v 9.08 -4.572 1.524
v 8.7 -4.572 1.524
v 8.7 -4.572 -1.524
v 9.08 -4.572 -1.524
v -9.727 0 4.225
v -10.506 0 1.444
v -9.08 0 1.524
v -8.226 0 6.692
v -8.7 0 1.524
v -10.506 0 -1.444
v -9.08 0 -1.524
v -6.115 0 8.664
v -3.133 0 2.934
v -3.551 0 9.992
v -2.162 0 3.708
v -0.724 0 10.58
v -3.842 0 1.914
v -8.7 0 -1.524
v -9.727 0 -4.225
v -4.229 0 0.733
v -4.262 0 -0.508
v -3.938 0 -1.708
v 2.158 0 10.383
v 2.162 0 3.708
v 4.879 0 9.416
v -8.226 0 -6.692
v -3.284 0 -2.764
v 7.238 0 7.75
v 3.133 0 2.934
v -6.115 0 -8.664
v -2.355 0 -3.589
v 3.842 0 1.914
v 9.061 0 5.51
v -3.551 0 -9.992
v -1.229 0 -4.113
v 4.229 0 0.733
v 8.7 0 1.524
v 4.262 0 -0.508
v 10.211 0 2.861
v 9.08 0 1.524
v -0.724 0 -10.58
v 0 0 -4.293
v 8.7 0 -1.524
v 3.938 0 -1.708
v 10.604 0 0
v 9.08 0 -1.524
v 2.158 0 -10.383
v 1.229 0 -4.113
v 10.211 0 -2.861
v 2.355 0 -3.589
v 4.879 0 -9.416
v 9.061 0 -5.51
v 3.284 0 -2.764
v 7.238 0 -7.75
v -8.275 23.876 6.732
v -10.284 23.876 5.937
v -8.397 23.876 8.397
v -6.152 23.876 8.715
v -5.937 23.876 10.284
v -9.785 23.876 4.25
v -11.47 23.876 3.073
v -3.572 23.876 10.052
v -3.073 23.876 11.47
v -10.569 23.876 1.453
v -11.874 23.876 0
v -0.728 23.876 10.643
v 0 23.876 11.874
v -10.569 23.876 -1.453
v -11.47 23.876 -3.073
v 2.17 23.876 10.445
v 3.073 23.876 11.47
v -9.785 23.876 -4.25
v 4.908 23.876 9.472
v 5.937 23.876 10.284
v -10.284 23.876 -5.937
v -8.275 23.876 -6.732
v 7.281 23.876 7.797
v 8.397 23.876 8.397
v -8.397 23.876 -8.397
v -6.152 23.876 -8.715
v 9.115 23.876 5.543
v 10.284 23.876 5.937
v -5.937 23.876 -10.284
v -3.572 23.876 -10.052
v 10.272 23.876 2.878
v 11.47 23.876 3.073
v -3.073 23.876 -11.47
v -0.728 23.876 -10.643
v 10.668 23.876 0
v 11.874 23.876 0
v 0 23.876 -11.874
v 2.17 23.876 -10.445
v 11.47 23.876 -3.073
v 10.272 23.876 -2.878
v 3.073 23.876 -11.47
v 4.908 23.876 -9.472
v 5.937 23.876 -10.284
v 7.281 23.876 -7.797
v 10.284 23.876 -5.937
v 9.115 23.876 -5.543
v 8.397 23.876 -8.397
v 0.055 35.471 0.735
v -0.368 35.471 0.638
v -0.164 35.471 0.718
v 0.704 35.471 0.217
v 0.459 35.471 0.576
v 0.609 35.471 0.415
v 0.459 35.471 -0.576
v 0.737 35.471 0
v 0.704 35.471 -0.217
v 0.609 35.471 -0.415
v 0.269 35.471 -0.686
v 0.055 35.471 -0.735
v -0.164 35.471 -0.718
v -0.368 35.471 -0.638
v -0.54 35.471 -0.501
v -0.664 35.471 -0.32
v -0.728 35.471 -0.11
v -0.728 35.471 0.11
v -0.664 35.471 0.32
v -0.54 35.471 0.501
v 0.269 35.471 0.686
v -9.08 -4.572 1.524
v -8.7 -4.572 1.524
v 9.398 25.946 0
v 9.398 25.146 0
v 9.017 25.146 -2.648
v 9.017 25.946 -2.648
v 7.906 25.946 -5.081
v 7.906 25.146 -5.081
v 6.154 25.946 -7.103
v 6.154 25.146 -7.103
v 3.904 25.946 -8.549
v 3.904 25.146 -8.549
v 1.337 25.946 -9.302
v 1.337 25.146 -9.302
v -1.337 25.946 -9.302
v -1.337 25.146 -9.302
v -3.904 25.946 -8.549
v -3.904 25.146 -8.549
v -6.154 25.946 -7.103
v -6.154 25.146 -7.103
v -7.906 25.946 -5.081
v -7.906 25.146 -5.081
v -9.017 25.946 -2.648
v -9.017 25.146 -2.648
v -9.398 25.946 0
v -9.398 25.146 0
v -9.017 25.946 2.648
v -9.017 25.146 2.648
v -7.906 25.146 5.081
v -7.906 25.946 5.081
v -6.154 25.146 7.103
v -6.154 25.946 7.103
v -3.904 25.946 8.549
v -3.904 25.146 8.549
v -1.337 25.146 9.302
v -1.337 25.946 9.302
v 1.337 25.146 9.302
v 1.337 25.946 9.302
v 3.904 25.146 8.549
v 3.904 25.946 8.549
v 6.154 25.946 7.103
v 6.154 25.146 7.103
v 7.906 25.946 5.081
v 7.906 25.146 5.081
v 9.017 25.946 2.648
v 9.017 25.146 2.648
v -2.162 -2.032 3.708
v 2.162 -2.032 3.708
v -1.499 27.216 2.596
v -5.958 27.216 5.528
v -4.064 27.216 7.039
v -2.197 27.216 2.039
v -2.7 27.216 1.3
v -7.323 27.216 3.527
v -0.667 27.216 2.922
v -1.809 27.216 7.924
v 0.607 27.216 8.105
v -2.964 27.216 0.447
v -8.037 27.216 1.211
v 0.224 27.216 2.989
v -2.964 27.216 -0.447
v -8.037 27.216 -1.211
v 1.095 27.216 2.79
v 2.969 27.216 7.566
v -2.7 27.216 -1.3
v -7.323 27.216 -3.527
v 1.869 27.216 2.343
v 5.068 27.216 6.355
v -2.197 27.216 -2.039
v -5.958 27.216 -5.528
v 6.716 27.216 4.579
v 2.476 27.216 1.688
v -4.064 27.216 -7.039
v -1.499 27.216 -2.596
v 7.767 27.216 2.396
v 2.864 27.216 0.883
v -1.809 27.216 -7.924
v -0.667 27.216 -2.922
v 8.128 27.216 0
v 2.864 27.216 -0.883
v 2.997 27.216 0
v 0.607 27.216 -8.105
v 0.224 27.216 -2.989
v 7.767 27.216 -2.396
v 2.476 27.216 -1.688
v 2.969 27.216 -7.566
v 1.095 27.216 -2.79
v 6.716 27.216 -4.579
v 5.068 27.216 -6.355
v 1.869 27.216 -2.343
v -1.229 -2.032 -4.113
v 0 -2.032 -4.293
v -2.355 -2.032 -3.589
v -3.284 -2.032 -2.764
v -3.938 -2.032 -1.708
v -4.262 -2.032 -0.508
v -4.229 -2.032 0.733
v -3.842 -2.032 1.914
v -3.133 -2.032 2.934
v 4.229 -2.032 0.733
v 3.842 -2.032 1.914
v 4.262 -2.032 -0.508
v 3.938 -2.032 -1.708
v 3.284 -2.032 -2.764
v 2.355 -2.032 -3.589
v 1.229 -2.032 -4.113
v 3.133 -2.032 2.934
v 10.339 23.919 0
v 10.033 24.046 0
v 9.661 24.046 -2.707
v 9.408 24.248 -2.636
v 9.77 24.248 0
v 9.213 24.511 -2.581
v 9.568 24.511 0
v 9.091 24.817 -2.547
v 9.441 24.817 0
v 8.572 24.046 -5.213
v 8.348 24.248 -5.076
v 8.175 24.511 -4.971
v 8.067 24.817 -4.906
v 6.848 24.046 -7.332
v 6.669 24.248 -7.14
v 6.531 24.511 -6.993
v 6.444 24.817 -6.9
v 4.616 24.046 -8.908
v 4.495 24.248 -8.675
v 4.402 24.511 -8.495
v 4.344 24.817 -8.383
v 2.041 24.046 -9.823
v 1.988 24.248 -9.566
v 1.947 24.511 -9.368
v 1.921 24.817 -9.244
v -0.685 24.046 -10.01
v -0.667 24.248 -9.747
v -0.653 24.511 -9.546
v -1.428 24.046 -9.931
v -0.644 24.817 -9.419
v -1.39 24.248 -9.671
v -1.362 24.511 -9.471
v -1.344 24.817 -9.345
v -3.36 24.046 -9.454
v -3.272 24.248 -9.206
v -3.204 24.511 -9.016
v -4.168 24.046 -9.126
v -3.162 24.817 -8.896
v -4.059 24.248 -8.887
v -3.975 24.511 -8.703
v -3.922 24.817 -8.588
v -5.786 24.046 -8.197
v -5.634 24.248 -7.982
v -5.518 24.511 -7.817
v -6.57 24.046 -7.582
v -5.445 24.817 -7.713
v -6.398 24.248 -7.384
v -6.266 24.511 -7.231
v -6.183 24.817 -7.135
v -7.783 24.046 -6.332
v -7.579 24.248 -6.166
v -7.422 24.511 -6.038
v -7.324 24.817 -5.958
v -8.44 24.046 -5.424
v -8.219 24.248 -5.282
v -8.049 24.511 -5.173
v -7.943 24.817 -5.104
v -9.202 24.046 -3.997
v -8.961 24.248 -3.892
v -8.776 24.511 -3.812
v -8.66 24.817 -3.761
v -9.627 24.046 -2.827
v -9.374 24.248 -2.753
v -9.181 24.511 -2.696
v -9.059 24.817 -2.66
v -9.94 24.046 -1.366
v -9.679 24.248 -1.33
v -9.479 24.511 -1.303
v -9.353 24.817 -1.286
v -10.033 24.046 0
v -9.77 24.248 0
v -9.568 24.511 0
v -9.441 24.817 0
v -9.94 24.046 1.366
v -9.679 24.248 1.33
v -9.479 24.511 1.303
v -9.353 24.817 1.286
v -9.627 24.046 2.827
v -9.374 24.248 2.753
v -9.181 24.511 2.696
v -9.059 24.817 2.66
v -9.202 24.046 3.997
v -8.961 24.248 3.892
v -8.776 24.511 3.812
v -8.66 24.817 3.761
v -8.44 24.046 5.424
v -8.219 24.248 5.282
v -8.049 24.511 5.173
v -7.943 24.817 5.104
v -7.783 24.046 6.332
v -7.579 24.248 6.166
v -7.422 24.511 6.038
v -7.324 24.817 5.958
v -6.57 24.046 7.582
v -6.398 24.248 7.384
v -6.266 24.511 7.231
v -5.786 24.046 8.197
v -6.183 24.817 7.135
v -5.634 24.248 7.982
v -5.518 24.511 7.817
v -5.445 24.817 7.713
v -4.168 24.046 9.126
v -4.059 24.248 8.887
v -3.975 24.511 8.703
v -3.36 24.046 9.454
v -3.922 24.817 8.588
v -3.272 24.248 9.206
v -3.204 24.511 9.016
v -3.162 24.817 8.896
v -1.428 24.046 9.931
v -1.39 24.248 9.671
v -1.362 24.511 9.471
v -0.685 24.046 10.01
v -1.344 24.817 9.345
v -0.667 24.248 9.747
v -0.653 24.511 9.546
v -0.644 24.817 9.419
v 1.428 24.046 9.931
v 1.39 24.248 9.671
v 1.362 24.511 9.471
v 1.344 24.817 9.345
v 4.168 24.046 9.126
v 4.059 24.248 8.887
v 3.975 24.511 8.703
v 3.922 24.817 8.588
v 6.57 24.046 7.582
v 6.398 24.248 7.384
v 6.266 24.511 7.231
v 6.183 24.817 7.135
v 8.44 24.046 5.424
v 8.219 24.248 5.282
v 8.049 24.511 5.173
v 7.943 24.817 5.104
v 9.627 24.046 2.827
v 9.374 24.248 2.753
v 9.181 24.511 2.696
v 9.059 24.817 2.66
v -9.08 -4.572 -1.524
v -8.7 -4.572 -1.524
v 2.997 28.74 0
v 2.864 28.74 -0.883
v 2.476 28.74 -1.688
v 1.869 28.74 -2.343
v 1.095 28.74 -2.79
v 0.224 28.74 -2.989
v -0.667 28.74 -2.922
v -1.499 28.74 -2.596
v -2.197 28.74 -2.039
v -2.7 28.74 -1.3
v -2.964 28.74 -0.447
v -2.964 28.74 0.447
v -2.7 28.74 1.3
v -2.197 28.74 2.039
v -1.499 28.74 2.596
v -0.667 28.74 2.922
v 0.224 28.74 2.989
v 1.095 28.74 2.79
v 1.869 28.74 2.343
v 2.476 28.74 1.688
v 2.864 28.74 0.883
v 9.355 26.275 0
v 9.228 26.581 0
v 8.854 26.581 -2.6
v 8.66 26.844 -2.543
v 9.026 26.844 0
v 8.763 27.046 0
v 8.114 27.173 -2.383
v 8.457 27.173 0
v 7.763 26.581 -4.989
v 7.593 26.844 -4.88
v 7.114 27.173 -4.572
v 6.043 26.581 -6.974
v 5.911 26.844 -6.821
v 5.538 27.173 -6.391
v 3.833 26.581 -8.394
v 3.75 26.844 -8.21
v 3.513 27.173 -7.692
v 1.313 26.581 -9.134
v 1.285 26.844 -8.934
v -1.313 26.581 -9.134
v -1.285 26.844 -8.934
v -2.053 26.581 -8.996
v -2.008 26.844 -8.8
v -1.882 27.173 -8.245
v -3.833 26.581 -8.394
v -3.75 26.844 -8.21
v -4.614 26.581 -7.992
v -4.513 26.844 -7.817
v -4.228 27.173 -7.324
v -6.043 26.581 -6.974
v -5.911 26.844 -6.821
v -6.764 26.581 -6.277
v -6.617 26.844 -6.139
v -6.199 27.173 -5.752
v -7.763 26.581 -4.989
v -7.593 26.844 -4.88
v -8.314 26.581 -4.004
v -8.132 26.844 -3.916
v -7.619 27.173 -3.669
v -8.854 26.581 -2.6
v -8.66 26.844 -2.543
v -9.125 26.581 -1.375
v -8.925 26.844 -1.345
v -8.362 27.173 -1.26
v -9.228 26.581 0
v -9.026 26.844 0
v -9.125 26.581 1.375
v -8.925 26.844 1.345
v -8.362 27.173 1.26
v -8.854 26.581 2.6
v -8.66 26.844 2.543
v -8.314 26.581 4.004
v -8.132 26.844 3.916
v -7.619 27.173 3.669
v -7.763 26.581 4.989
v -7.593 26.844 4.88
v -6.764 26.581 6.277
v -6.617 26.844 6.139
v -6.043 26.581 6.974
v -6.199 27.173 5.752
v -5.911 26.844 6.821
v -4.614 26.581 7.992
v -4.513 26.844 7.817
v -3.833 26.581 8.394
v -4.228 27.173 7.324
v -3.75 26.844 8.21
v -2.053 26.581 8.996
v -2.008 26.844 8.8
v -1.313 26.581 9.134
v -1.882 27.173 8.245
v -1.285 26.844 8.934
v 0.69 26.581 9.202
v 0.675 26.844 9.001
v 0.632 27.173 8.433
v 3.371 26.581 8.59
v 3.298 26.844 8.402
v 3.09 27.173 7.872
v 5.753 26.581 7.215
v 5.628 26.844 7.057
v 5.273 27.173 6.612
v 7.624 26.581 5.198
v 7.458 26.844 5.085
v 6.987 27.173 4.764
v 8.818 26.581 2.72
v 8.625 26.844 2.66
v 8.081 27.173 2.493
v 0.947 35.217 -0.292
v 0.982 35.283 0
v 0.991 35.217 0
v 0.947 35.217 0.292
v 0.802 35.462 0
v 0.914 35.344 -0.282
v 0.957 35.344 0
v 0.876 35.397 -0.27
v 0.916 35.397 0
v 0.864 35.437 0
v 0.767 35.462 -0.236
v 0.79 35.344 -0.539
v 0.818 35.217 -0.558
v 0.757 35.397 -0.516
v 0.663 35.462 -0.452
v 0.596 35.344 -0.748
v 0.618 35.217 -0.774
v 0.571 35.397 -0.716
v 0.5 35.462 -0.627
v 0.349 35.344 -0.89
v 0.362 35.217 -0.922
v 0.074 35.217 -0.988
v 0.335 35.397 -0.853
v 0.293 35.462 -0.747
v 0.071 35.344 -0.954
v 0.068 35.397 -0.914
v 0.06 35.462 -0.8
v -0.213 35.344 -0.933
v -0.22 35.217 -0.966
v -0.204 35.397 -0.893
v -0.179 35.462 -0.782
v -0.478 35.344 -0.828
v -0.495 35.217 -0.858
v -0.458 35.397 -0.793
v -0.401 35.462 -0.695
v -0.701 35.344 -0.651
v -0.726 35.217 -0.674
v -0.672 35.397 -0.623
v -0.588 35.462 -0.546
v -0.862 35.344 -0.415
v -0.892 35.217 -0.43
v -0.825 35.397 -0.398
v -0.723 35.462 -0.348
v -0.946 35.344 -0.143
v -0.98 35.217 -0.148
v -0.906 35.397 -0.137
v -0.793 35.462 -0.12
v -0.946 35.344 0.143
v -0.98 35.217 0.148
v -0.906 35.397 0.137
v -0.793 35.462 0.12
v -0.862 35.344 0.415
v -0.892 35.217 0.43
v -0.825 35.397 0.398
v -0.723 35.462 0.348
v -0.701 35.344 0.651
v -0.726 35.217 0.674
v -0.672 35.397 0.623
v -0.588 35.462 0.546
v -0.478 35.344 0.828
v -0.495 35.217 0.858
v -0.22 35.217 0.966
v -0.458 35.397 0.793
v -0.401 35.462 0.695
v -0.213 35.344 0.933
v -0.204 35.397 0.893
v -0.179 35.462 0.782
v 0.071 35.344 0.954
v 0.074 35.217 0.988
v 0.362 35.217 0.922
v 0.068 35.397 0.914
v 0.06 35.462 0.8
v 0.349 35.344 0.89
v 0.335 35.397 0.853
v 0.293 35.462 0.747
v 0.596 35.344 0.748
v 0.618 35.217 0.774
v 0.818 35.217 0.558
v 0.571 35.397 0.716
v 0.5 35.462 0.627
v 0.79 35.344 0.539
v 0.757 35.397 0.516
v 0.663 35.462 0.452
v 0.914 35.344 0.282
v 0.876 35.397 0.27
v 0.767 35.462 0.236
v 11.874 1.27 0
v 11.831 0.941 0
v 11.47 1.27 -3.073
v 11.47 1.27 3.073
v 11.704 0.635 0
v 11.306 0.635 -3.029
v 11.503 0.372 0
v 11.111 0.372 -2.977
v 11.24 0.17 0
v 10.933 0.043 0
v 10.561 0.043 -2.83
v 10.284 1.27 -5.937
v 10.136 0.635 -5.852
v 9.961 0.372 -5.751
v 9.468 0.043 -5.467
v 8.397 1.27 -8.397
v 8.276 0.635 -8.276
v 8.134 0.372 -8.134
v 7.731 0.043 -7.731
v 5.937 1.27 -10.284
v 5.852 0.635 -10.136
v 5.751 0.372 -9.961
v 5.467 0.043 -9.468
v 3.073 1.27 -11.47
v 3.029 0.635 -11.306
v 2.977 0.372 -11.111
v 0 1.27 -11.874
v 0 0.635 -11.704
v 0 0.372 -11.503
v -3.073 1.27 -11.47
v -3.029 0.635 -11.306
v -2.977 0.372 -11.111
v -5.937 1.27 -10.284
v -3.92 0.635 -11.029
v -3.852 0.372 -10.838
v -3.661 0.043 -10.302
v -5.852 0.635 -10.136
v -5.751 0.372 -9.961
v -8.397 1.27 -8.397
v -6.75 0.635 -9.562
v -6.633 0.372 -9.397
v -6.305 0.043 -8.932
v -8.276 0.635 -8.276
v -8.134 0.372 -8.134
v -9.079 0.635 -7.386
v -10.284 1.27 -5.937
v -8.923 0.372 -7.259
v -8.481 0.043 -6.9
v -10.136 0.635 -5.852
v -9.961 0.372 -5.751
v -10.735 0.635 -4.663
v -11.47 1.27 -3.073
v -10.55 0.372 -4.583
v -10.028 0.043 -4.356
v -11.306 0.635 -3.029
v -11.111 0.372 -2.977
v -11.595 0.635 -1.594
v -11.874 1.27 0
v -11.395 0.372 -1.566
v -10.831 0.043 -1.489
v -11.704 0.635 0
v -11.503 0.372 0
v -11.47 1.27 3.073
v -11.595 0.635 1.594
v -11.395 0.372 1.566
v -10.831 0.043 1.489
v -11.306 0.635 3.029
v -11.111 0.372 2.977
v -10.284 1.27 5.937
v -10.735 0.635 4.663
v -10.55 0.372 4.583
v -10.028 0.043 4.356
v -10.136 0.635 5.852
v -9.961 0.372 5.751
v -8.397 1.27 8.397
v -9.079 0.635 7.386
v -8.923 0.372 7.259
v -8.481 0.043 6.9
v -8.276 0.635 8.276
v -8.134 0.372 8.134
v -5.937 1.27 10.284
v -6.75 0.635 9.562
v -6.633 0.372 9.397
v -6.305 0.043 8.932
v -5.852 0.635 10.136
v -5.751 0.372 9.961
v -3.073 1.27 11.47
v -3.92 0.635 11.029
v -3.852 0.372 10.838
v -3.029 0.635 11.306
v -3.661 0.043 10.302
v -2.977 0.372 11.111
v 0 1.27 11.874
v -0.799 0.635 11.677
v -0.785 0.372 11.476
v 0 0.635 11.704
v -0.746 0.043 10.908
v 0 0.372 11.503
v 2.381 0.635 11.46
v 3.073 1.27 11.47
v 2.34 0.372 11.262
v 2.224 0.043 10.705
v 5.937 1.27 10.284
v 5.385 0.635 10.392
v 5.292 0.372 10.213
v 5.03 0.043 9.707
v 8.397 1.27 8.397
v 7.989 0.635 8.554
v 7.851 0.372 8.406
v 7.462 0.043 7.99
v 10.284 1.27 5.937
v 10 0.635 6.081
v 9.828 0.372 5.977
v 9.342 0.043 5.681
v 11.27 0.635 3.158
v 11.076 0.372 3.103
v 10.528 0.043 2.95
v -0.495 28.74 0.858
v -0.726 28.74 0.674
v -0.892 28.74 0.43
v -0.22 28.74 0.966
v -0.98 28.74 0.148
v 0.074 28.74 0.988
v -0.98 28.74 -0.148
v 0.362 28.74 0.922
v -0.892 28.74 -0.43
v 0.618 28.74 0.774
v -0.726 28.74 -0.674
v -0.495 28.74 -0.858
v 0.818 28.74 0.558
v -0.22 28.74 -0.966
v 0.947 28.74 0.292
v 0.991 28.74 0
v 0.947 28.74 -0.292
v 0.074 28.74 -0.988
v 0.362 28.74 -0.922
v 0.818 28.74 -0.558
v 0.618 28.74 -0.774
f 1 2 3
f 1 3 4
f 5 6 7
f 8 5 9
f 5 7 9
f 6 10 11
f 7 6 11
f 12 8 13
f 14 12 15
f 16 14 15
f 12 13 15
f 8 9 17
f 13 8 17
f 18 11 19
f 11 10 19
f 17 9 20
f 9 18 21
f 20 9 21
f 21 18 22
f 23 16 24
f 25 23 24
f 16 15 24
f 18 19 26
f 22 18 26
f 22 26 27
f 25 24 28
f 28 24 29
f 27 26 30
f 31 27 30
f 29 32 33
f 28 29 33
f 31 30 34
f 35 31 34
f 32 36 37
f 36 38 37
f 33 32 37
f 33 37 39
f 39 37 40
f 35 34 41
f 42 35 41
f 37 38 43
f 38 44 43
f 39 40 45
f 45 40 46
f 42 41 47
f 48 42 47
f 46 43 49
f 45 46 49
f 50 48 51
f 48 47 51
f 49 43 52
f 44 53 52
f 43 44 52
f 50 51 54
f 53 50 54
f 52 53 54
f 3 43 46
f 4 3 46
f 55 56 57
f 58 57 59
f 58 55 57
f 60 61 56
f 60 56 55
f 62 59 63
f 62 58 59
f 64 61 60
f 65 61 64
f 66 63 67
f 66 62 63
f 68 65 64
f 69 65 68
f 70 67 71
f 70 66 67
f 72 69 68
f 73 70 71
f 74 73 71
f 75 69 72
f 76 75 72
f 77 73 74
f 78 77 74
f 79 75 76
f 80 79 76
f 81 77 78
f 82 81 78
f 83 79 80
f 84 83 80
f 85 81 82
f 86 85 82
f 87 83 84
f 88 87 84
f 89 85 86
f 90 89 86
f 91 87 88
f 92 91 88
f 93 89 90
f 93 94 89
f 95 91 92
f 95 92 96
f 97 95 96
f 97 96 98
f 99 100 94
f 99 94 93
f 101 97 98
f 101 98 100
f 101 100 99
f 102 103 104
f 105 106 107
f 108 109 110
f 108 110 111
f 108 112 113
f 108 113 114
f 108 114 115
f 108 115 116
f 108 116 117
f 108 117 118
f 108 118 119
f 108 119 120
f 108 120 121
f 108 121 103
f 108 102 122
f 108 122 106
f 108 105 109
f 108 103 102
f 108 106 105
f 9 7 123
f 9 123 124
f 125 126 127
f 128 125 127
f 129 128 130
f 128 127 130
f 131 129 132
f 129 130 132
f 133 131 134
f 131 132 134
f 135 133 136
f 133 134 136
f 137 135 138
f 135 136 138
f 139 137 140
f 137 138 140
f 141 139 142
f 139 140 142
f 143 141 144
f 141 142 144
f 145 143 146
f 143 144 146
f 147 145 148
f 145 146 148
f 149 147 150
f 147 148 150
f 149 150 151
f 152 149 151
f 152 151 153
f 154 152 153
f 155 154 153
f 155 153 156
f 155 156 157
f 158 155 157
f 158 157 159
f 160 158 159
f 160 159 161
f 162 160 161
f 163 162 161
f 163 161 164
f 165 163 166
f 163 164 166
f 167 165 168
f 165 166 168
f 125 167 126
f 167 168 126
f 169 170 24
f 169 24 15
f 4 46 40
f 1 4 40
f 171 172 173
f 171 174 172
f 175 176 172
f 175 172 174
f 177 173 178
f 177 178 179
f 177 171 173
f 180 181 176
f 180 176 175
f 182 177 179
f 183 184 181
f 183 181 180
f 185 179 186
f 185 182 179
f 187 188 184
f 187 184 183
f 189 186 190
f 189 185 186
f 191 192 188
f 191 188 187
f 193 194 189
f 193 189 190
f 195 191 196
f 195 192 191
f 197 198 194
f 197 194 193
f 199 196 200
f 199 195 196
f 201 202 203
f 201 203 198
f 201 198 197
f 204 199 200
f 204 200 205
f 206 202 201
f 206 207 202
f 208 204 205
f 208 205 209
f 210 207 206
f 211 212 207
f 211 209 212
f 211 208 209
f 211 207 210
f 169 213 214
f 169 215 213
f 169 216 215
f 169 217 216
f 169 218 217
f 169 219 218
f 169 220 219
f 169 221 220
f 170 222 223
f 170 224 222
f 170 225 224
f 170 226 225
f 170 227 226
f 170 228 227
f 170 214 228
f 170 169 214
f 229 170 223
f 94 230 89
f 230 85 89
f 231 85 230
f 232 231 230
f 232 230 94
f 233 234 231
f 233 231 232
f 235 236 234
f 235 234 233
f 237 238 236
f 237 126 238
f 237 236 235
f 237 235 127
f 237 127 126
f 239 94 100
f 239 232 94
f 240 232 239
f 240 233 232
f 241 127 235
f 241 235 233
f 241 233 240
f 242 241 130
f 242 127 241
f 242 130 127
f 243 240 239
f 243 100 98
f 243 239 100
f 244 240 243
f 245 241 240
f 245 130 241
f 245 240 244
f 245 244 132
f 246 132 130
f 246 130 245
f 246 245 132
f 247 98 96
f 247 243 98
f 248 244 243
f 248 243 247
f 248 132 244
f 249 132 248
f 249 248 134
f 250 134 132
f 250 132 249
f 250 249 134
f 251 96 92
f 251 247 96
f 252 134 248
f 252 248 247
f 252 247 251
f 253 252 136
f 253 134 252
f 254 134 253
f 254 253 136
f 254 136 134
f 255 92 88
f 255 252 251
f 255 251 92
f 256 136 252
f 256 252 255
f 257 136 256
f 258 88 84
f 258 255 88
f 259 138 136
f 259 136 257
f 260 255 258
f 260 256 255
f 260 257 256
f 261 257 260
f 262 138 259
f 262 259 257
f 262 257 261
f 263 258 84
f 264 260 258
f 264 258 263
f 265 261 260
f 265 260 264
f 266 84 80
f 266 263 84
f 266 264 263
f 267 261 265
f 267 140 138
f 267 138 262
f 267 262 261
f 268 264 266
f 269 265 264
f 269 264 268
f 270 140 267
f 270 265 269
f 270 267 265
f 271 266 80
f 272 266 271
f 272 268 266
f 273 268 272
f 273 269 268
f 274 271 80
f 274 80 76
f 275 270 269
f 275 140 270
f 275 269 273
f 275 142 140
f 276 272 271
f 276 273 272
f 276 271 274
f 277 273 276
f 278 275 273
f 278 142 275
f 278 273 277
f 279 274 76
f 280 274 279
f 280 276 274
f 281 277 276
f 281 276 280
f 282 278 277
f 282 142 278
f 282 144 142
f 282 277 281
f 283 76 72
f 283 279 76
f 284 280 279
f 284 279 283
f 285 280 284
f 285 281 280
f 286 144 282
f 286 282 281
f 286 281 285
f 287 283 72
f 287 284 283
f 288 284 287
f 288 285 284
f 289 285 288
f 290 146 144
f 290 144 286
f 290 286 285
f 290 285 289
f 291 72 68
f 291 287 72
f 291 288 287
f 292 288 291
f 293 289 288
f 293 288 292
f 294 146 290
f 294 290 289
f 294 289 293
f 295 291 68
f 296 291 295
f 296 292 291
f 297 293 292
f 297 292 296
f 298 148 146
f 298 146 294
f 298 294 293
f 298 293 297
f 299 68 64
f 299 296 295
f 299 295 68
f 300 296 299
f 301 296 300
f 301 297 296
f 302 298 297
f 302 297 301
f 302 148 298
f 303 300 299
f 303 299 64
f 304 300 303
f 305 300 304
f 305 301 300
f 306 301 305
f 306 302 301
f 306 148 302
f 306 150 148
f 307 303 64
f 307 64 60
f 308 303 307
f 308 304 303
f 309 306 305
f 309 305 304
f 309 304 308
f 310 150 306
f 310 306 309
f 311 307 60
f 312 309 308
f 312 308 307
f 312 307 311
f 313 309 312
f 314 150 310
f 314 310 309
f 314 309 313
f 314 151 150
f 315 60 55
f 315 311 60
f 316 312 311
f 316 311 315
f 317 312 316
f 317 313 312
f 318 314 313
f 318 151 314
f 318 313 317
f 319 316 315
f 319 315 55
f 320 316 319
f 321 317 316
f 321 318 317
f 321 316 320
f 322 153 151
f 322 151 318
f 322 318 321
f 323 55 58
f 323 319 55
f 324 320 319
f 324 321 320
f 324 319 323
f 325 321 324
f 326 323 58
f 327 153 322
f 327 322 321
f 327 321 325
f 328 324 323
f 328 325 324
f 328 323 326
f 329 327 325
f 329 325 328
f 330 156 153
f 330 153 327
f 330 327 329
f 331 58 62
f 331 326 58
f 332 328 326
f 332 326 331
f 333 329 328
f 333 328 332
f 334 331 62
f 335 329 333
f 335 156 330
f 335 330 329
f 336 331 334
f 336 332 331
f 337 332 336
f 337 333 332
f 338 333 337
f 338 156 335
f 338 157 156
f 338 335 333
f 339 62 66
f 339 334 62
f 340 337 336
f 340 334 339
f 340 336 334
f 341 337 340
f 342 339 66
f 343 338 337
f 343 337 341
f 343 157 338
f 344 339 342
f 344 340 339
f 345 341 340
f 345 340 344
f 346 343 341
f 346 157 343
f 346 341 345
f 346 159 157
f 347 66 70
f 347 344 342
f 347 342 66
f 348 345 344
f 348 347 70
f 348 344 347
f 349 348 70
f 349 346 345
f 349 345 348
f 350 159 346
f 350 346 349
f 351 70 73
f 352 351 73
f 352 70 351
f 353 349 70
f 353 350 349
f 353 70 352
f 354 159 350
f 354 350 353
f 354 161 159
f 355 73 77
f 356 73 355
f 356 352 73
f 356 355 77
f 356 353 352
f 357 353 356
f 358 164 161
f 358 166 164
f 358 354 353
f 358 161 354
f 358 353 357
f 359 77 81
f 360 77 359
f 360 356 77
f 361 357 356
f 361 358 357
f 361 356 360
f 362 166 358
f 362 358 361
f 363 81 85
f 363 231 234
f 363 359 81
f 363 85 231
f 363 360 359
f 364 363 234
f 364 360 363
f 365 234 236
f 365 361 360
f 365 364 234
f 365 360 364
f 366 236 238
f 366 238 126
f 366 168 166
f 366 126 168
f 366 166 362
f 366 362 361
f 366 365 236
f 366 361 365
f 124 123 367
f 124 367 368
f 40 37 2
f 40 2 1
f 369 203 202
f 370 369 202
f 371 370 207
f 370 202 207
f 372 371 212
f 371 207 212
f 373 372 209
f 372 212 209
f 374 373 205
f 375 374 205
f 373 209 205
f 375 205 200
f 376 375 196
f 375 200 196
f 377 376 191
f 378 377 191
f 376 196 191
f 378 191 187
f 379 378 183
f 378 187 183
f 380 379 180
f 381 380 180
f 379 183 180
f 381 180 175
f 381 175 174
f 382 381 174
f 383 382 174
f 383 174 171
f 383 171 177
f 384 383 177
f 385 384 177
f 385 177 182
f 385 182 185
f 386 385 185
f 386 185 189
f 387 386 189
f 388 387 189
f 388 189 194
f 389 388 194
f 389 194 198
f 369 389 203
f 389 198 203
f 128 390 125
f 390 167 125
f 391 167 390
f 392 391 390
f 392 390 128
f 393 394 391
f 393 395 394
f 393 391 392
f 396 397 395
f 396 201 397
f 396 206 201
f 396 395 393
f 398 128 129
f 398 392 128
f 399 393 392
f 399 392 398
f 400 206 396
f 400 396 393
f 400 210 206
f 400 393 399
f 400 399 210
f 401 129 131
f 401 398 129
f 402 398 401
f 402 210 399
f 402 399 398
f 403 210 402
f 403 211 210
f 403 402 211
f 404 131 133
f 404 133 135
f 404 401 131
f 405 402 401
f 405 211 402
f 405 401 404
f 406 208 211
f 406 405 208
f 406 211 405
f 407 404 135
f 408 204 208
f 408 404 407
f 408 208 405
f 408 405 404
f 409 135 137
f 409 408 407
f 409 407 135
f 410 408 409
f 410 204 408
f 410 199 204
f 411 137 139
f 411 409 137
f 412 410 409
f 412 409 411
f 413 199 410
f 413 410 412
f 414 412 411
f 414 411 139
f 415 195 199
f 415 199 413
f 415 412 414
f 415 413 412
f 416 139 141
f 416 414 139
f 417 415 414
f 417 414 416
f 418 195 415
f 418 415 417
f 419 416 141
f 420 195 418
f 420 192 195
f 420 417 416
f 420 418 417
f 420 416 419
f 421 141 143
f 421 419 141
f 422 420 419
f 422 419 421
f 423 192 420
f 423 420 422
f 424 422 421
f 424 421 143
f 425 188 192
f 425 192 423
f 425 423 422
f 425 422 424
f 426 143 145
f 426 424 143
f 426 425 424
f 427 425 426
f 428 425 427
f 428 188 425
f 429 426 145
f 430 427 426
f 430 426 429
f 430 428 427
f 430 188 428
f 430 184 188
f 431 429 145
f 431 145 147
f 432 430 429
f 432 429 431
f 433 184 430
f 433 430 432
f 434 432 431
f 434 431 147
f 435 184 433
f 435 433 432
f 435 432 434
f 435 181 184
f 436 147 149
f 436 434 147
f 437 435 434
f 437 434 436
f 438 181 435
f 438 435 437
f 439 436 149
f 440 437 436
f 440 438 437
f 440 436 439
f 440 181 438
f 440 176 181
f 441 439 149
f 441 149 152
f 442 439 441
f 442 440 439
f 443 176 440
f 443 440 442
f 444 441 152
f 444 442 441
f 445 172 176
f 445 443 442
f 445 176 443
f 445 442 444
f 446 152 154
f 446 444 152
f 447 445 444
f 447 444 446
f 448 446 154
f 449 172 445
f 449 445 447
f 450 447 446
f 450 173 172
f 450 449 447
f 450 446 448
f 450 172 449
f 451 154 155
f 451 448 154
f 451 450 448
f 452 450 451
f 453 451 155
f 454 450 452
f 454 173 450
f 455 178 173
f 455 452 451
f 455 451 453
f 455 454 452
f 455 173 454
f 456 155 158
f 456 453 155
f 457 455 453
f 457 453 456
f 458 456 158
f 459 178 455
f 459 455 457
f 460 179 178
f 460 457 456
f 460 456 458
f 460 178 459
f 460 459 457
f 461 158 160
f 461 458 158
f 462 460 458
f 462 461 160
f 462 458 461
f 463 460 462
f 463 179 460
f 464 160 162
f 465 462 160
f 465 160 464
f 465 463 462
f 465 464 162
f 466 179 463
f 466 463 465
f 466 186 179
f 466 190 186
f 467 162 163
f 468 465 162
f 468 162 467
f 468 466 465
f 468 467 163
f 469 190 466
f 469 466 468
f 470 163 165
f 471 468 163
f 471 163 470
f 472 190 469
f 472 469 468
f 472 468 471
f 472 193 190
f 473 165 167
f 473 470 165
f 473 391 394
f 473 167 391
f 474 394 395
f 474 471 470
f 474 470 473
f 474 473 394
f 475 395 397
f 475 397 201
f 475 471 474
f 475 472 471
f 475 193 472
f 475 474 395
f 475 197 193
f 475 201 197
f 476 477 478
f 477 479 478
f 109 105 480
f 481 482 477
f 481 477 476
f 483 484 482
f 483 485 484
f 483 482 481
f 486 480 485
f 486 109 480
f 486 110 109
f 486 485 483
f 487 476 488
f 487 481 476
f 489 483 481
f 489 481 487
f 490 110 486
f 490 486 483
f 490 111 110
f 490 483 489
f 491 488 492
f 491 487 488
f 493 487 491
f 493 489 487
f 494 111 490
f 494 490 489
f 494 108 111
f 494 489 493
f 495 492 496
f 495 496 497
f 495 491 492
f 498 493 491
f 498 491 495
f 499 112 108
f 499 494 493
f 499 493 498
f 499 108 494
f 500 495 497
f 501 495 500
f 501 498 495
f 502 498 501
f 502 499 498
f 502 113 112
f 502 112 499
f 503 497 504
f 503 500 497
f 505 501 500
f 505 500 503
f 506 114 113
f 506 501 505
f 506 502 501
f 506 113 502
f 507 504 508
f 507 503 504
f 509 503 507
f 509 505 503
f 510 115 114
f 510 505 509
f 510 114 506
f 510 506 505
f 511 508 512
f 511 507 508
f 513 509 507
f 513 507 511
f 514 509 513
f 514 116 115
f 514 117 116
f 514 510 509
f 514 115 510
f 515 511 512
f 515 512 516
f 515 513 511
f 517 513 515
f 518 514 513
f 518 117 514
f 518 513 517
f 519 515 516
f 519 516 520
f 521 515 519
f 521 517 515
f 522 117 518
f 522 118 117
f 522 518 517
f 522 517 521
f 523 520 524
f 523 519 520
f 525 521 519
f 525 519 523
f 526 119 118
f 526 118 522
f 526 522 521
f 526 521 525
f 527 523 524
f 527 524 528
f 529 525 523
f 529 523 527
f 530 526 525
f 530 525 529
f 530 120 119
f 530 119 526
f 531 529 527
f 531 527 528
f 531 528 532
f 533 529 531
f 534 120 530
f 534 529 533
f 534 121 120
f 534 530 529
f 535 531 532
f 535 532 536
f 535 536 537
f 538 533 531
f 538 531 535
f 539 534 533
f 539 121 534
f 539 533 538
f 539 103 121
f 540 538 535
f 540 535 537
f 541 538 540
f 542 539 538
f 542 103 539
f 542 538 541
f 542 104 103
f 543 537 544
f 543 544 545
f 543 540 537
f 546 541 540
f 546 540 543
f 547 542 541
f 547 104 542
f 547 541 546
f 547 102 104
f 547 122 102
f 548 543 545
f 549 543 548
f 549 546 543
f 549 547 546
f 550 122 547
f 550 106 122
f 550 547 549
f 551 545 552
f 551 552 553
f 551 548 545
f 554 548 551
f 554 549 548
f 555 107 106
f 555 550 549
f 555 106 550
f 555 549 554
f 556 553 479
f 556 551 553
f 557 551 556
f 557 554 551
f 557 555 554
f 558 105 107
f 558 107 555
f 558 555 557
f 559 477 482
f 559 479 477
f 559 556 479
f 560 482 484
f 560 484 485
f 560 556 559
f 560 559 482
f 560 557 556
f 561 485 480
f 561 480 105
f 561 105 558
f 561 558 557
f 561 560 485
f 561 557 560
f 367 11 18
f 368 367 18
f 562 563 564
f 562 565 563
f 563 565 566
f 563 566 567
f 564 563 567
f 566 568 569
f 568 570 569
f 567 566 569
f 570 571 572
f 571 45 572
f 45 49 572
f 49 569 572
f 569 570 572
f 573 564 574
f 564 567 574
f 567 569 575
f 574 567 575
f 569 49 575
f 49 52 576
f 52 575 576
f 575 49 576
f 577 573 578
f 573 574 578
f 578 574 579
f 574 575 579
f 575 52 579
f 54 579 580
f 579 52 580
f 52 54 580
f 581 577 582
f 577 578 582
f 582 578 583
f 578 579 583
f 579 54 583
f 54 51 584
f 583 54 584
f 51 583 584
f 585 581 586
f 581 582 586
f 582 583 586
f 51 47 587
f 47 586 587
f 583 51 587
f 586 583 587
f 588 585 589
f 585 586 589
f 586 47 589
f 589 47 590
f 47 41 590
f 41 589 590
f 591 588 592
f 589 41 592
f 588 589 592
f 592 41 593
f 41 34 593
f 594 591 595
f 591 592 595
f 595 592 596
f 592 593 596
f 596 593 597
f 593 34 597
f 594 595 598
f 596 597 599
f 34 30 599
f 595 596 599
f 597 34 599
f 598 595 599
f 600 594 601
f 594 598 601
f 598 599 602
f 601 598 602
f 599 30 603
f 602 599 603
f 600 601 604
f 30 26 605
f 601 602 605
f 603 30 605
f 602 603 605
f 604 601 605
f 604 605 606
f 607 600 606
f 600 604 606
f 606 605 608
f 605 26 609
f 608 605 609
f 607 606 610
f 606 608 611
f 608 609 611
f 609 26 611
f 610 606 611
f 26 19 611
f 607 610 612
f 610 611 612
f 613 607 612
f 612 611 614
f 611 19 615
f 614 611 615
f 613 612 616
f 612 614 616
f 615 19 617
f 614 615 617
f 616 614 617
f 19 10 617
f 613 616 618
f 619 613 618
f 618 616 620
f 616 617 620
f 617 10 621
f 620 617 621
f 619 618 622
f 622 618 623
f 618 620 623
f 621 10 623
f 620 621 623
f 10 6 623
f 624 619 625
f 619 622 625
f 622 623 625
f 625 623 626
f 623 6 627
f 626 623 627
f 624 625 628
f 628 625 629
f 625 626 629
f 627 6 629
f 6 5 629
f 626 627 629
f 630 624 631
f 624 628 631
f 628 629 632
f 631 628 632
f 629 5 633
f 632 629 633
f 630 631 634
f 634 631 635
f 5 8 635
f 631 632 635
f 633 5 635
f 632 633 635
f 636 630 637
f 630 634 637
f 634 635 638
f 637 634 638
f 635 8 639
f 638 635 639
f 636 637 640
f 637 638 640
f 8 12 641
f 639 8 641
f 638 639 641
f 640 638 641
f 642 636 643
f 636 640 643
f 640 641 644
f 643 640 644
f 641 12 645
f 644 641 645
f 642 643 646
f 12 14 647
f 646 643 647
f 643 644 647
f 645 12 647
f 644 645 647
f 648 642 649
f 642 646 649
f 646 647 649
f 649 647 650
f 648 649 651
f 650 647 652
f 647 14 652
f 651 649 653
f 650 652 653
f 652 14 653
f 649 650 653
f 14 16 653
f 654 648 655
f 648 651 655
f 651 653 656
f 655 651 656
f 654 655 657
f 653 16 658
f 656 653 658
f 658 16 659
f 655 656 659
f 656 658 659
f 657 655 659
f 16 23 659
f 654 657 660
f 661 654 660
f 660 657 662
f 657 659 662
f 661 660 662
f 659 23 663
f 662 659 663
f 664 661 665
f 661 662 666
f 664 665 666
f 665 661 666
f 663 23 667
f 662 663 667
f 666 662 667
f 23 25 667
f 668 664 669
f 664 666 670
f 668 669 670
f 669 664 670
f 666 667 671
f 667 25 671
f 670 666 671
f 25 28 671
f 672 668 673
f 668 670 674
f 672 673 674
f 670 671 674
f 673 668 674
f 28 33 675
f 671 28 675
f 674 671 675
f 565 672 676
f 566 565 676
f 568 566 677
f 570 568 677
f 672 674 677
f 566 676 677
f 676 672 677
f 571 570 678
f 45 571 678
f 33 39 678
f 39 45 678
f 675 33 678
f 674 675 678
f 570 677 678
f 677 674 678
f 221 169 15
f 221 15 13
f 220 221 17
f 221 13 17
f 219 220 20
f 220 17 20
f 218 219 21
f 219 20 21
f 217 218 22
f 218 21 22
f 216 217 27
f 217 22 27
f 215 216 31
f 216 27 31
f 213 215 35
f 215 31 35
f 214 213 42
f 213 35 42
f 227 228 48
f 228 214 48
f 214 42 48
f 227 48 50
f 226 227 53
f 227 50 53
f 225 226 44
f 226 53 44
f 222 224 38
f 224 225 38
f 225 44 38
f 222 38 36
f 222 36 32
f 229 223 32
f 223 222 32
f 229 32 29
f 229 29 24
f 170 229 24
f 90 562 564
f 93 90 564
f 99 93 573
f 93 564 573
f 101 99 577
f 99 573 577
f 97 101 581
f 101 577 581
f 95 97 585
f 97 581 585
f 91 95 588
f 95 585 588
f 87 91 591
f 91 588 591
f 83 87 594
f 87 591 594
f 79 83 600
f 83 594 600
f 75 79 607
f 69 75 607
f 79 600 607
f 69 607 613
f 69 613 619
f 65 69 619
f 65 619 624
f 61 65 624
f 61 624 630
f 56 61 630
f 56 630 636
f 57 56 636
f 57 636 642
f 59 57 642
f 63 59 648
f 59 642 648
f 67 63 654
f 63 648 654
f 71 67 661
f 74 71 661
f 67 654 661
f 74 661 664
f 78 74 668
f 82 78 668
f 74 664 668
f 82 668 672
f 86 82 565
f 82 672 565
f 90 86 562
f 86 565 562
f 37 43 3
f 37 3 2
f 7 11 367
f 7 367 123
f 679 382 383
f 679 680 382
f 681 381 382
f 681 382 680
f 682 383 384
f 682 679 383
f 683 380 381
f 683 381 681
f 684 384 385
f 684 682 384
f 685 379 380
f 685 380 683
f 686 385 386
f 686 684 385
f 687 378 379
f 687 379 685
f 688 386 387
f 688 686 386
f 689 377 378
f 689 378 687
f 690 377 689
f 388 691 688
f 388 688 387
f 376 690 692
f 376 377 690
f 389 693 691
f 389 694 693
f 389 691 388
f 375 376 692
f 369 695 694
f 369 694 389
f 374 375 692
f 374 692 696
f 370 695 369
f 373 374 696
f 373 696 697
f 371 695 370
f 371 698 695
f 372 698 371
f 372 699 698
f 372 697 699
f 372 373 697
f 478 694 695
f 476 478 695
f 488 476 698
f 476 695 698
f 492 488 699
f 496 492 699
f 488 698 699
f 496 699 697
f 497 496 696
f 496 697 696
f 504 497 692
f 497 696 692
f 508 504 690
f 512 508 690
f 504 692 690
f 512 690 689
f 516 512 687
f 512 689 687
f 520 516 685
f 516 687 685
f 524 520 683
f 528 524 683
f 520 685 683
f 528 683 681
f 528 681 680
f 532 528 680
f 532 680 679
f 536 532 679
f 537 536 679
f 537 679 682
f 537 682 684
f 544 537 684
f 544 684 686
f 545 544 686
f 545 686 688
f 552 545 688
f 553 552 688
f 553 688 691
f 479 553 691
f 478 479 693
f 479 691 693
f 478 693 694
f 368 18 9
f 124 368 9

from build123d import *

# Parameters (mm, degrees)
SKETCH1_R           = 11.8745
BOSS_EXTRUDE1_DEPTH = 23.876
SKETCH2_R           = 9.398
BOSS_EXTRUDE2_DEPTH = 3.3401
SKETCH3_R           = 2.9972
BOSS_EXTRUDE3_DEPTH = 1.524
SKETCH4_R           = 0.9906
BOSS_EXTRUDE4_DEPTH = 6.731
SKETCH5_R           = 4.2926
BOSS_EXTRUDE5_DEPTH = 2.032
CUT_EXTRUDE1_DEPTH  = 2.032
SKETCH7_W           = 0.381
SKETCH7_H           = 3.048
BOSS_EXTRUDE6_DEPTH = 4.572
FILLET1_R           = 1.27
FILLET2_R           = 0.254


with BuildPart() as part:
    # Sketch1 → Boss-Extrude1 (new body)
    with BuildSketch(Plane(origin=(0, 0, 0), x_dir=(1, 0, 0), z_dir=(0, 1, 0))):
        Circle(SKETCH1_R)
    extrude(amount=BOSS_EXTRUDE1_DEPTH)

    # Sketch2 → Boss-Extrude2 (add)
    with BuildSketch(Plane(origin=(0, 23.876, 0), x_dir=(1, 0, 0), z_dir=(0, 1, 0))):
        Circle(SKETCH2_R)
    extrude(amount=BOSS_EXTRUDE2_DEPTH)

    # Sketch3 → Boss-Extrude3 (add)
    with BuildSketch(Plane(origin=(0, 27.2161, 0), x_dir=(1, 0, 0), z_dir=(0, 1, 0))):
        Circle(SKETCH3_R)
    extrude(amount=BOSS_EXTRUDE3_DEPTH)

    # Sketch4 → Boss-Extrude4 (add)
    with BuildSketch(Plane(origin=(0, 28.7401, 0), x_dir=(1, 0, 0), z_dir=(0, 1, 0))):
        Circle(SKETCH4_R)
    extrude(amount=BOSS_EXTRUDE4_DEPTH)

    # Sketch5 → Boss-Extrude5 (add)
    with BuildSketch(Plane.XZ):
        Circle(SKETCH5_R)
    extrude(amount=BOSS_EXTRUDE5_DEPTH)

    # Sketch6 → Cut-Extrude1 (cut)
    with BuildSketch(Plane.XZ.offset(2.032)):
        with BuildLine():
            Line((2.16198617, 3.7084), (-2.16198617, 3.7084))
            ThreePointArc((-2.16198617, 3.7084), (0, 4.2926), (2.16198617, 3.7084))
        make_face()
    extrude(amount=-CUT_EXTRUDE1_DEPTH, mode=Mode.SUBTRACT)

    # Sketch7 → Boss-Extrude6 (add)
    with BuildSketch(Plane.XZ):
        with Locations((-8.89, 0)):
            Rectangle(SKETCH7_W, SKETCH7_H)
        with Locations((8.89, 0)):
            Rectangle(SKETCH7_W, SKETCH7_H)
    extrude(amount=BOSS_EXTRUDE6_DEPTH)

    # Fillet1
    fillet1_edges = [part.edges().sort_by_distance(p)[0] for p in [
        (-11.8745, 0, 0),
        (-9.398, 23.876, 0),
        (-9.398, 27.2161, 0),
    ]]
    fillet(fillet1_edges, radius=FILLET1_R)

    # Fillet2
    fillet2_edges = [part.edges().sort_by_distance(p)[0] for p in [
        (-0.9906, 35.4711, 0),
    ]]
    fillet(fillet2_edges, radius=FILLET2_R)


solid = part.part
